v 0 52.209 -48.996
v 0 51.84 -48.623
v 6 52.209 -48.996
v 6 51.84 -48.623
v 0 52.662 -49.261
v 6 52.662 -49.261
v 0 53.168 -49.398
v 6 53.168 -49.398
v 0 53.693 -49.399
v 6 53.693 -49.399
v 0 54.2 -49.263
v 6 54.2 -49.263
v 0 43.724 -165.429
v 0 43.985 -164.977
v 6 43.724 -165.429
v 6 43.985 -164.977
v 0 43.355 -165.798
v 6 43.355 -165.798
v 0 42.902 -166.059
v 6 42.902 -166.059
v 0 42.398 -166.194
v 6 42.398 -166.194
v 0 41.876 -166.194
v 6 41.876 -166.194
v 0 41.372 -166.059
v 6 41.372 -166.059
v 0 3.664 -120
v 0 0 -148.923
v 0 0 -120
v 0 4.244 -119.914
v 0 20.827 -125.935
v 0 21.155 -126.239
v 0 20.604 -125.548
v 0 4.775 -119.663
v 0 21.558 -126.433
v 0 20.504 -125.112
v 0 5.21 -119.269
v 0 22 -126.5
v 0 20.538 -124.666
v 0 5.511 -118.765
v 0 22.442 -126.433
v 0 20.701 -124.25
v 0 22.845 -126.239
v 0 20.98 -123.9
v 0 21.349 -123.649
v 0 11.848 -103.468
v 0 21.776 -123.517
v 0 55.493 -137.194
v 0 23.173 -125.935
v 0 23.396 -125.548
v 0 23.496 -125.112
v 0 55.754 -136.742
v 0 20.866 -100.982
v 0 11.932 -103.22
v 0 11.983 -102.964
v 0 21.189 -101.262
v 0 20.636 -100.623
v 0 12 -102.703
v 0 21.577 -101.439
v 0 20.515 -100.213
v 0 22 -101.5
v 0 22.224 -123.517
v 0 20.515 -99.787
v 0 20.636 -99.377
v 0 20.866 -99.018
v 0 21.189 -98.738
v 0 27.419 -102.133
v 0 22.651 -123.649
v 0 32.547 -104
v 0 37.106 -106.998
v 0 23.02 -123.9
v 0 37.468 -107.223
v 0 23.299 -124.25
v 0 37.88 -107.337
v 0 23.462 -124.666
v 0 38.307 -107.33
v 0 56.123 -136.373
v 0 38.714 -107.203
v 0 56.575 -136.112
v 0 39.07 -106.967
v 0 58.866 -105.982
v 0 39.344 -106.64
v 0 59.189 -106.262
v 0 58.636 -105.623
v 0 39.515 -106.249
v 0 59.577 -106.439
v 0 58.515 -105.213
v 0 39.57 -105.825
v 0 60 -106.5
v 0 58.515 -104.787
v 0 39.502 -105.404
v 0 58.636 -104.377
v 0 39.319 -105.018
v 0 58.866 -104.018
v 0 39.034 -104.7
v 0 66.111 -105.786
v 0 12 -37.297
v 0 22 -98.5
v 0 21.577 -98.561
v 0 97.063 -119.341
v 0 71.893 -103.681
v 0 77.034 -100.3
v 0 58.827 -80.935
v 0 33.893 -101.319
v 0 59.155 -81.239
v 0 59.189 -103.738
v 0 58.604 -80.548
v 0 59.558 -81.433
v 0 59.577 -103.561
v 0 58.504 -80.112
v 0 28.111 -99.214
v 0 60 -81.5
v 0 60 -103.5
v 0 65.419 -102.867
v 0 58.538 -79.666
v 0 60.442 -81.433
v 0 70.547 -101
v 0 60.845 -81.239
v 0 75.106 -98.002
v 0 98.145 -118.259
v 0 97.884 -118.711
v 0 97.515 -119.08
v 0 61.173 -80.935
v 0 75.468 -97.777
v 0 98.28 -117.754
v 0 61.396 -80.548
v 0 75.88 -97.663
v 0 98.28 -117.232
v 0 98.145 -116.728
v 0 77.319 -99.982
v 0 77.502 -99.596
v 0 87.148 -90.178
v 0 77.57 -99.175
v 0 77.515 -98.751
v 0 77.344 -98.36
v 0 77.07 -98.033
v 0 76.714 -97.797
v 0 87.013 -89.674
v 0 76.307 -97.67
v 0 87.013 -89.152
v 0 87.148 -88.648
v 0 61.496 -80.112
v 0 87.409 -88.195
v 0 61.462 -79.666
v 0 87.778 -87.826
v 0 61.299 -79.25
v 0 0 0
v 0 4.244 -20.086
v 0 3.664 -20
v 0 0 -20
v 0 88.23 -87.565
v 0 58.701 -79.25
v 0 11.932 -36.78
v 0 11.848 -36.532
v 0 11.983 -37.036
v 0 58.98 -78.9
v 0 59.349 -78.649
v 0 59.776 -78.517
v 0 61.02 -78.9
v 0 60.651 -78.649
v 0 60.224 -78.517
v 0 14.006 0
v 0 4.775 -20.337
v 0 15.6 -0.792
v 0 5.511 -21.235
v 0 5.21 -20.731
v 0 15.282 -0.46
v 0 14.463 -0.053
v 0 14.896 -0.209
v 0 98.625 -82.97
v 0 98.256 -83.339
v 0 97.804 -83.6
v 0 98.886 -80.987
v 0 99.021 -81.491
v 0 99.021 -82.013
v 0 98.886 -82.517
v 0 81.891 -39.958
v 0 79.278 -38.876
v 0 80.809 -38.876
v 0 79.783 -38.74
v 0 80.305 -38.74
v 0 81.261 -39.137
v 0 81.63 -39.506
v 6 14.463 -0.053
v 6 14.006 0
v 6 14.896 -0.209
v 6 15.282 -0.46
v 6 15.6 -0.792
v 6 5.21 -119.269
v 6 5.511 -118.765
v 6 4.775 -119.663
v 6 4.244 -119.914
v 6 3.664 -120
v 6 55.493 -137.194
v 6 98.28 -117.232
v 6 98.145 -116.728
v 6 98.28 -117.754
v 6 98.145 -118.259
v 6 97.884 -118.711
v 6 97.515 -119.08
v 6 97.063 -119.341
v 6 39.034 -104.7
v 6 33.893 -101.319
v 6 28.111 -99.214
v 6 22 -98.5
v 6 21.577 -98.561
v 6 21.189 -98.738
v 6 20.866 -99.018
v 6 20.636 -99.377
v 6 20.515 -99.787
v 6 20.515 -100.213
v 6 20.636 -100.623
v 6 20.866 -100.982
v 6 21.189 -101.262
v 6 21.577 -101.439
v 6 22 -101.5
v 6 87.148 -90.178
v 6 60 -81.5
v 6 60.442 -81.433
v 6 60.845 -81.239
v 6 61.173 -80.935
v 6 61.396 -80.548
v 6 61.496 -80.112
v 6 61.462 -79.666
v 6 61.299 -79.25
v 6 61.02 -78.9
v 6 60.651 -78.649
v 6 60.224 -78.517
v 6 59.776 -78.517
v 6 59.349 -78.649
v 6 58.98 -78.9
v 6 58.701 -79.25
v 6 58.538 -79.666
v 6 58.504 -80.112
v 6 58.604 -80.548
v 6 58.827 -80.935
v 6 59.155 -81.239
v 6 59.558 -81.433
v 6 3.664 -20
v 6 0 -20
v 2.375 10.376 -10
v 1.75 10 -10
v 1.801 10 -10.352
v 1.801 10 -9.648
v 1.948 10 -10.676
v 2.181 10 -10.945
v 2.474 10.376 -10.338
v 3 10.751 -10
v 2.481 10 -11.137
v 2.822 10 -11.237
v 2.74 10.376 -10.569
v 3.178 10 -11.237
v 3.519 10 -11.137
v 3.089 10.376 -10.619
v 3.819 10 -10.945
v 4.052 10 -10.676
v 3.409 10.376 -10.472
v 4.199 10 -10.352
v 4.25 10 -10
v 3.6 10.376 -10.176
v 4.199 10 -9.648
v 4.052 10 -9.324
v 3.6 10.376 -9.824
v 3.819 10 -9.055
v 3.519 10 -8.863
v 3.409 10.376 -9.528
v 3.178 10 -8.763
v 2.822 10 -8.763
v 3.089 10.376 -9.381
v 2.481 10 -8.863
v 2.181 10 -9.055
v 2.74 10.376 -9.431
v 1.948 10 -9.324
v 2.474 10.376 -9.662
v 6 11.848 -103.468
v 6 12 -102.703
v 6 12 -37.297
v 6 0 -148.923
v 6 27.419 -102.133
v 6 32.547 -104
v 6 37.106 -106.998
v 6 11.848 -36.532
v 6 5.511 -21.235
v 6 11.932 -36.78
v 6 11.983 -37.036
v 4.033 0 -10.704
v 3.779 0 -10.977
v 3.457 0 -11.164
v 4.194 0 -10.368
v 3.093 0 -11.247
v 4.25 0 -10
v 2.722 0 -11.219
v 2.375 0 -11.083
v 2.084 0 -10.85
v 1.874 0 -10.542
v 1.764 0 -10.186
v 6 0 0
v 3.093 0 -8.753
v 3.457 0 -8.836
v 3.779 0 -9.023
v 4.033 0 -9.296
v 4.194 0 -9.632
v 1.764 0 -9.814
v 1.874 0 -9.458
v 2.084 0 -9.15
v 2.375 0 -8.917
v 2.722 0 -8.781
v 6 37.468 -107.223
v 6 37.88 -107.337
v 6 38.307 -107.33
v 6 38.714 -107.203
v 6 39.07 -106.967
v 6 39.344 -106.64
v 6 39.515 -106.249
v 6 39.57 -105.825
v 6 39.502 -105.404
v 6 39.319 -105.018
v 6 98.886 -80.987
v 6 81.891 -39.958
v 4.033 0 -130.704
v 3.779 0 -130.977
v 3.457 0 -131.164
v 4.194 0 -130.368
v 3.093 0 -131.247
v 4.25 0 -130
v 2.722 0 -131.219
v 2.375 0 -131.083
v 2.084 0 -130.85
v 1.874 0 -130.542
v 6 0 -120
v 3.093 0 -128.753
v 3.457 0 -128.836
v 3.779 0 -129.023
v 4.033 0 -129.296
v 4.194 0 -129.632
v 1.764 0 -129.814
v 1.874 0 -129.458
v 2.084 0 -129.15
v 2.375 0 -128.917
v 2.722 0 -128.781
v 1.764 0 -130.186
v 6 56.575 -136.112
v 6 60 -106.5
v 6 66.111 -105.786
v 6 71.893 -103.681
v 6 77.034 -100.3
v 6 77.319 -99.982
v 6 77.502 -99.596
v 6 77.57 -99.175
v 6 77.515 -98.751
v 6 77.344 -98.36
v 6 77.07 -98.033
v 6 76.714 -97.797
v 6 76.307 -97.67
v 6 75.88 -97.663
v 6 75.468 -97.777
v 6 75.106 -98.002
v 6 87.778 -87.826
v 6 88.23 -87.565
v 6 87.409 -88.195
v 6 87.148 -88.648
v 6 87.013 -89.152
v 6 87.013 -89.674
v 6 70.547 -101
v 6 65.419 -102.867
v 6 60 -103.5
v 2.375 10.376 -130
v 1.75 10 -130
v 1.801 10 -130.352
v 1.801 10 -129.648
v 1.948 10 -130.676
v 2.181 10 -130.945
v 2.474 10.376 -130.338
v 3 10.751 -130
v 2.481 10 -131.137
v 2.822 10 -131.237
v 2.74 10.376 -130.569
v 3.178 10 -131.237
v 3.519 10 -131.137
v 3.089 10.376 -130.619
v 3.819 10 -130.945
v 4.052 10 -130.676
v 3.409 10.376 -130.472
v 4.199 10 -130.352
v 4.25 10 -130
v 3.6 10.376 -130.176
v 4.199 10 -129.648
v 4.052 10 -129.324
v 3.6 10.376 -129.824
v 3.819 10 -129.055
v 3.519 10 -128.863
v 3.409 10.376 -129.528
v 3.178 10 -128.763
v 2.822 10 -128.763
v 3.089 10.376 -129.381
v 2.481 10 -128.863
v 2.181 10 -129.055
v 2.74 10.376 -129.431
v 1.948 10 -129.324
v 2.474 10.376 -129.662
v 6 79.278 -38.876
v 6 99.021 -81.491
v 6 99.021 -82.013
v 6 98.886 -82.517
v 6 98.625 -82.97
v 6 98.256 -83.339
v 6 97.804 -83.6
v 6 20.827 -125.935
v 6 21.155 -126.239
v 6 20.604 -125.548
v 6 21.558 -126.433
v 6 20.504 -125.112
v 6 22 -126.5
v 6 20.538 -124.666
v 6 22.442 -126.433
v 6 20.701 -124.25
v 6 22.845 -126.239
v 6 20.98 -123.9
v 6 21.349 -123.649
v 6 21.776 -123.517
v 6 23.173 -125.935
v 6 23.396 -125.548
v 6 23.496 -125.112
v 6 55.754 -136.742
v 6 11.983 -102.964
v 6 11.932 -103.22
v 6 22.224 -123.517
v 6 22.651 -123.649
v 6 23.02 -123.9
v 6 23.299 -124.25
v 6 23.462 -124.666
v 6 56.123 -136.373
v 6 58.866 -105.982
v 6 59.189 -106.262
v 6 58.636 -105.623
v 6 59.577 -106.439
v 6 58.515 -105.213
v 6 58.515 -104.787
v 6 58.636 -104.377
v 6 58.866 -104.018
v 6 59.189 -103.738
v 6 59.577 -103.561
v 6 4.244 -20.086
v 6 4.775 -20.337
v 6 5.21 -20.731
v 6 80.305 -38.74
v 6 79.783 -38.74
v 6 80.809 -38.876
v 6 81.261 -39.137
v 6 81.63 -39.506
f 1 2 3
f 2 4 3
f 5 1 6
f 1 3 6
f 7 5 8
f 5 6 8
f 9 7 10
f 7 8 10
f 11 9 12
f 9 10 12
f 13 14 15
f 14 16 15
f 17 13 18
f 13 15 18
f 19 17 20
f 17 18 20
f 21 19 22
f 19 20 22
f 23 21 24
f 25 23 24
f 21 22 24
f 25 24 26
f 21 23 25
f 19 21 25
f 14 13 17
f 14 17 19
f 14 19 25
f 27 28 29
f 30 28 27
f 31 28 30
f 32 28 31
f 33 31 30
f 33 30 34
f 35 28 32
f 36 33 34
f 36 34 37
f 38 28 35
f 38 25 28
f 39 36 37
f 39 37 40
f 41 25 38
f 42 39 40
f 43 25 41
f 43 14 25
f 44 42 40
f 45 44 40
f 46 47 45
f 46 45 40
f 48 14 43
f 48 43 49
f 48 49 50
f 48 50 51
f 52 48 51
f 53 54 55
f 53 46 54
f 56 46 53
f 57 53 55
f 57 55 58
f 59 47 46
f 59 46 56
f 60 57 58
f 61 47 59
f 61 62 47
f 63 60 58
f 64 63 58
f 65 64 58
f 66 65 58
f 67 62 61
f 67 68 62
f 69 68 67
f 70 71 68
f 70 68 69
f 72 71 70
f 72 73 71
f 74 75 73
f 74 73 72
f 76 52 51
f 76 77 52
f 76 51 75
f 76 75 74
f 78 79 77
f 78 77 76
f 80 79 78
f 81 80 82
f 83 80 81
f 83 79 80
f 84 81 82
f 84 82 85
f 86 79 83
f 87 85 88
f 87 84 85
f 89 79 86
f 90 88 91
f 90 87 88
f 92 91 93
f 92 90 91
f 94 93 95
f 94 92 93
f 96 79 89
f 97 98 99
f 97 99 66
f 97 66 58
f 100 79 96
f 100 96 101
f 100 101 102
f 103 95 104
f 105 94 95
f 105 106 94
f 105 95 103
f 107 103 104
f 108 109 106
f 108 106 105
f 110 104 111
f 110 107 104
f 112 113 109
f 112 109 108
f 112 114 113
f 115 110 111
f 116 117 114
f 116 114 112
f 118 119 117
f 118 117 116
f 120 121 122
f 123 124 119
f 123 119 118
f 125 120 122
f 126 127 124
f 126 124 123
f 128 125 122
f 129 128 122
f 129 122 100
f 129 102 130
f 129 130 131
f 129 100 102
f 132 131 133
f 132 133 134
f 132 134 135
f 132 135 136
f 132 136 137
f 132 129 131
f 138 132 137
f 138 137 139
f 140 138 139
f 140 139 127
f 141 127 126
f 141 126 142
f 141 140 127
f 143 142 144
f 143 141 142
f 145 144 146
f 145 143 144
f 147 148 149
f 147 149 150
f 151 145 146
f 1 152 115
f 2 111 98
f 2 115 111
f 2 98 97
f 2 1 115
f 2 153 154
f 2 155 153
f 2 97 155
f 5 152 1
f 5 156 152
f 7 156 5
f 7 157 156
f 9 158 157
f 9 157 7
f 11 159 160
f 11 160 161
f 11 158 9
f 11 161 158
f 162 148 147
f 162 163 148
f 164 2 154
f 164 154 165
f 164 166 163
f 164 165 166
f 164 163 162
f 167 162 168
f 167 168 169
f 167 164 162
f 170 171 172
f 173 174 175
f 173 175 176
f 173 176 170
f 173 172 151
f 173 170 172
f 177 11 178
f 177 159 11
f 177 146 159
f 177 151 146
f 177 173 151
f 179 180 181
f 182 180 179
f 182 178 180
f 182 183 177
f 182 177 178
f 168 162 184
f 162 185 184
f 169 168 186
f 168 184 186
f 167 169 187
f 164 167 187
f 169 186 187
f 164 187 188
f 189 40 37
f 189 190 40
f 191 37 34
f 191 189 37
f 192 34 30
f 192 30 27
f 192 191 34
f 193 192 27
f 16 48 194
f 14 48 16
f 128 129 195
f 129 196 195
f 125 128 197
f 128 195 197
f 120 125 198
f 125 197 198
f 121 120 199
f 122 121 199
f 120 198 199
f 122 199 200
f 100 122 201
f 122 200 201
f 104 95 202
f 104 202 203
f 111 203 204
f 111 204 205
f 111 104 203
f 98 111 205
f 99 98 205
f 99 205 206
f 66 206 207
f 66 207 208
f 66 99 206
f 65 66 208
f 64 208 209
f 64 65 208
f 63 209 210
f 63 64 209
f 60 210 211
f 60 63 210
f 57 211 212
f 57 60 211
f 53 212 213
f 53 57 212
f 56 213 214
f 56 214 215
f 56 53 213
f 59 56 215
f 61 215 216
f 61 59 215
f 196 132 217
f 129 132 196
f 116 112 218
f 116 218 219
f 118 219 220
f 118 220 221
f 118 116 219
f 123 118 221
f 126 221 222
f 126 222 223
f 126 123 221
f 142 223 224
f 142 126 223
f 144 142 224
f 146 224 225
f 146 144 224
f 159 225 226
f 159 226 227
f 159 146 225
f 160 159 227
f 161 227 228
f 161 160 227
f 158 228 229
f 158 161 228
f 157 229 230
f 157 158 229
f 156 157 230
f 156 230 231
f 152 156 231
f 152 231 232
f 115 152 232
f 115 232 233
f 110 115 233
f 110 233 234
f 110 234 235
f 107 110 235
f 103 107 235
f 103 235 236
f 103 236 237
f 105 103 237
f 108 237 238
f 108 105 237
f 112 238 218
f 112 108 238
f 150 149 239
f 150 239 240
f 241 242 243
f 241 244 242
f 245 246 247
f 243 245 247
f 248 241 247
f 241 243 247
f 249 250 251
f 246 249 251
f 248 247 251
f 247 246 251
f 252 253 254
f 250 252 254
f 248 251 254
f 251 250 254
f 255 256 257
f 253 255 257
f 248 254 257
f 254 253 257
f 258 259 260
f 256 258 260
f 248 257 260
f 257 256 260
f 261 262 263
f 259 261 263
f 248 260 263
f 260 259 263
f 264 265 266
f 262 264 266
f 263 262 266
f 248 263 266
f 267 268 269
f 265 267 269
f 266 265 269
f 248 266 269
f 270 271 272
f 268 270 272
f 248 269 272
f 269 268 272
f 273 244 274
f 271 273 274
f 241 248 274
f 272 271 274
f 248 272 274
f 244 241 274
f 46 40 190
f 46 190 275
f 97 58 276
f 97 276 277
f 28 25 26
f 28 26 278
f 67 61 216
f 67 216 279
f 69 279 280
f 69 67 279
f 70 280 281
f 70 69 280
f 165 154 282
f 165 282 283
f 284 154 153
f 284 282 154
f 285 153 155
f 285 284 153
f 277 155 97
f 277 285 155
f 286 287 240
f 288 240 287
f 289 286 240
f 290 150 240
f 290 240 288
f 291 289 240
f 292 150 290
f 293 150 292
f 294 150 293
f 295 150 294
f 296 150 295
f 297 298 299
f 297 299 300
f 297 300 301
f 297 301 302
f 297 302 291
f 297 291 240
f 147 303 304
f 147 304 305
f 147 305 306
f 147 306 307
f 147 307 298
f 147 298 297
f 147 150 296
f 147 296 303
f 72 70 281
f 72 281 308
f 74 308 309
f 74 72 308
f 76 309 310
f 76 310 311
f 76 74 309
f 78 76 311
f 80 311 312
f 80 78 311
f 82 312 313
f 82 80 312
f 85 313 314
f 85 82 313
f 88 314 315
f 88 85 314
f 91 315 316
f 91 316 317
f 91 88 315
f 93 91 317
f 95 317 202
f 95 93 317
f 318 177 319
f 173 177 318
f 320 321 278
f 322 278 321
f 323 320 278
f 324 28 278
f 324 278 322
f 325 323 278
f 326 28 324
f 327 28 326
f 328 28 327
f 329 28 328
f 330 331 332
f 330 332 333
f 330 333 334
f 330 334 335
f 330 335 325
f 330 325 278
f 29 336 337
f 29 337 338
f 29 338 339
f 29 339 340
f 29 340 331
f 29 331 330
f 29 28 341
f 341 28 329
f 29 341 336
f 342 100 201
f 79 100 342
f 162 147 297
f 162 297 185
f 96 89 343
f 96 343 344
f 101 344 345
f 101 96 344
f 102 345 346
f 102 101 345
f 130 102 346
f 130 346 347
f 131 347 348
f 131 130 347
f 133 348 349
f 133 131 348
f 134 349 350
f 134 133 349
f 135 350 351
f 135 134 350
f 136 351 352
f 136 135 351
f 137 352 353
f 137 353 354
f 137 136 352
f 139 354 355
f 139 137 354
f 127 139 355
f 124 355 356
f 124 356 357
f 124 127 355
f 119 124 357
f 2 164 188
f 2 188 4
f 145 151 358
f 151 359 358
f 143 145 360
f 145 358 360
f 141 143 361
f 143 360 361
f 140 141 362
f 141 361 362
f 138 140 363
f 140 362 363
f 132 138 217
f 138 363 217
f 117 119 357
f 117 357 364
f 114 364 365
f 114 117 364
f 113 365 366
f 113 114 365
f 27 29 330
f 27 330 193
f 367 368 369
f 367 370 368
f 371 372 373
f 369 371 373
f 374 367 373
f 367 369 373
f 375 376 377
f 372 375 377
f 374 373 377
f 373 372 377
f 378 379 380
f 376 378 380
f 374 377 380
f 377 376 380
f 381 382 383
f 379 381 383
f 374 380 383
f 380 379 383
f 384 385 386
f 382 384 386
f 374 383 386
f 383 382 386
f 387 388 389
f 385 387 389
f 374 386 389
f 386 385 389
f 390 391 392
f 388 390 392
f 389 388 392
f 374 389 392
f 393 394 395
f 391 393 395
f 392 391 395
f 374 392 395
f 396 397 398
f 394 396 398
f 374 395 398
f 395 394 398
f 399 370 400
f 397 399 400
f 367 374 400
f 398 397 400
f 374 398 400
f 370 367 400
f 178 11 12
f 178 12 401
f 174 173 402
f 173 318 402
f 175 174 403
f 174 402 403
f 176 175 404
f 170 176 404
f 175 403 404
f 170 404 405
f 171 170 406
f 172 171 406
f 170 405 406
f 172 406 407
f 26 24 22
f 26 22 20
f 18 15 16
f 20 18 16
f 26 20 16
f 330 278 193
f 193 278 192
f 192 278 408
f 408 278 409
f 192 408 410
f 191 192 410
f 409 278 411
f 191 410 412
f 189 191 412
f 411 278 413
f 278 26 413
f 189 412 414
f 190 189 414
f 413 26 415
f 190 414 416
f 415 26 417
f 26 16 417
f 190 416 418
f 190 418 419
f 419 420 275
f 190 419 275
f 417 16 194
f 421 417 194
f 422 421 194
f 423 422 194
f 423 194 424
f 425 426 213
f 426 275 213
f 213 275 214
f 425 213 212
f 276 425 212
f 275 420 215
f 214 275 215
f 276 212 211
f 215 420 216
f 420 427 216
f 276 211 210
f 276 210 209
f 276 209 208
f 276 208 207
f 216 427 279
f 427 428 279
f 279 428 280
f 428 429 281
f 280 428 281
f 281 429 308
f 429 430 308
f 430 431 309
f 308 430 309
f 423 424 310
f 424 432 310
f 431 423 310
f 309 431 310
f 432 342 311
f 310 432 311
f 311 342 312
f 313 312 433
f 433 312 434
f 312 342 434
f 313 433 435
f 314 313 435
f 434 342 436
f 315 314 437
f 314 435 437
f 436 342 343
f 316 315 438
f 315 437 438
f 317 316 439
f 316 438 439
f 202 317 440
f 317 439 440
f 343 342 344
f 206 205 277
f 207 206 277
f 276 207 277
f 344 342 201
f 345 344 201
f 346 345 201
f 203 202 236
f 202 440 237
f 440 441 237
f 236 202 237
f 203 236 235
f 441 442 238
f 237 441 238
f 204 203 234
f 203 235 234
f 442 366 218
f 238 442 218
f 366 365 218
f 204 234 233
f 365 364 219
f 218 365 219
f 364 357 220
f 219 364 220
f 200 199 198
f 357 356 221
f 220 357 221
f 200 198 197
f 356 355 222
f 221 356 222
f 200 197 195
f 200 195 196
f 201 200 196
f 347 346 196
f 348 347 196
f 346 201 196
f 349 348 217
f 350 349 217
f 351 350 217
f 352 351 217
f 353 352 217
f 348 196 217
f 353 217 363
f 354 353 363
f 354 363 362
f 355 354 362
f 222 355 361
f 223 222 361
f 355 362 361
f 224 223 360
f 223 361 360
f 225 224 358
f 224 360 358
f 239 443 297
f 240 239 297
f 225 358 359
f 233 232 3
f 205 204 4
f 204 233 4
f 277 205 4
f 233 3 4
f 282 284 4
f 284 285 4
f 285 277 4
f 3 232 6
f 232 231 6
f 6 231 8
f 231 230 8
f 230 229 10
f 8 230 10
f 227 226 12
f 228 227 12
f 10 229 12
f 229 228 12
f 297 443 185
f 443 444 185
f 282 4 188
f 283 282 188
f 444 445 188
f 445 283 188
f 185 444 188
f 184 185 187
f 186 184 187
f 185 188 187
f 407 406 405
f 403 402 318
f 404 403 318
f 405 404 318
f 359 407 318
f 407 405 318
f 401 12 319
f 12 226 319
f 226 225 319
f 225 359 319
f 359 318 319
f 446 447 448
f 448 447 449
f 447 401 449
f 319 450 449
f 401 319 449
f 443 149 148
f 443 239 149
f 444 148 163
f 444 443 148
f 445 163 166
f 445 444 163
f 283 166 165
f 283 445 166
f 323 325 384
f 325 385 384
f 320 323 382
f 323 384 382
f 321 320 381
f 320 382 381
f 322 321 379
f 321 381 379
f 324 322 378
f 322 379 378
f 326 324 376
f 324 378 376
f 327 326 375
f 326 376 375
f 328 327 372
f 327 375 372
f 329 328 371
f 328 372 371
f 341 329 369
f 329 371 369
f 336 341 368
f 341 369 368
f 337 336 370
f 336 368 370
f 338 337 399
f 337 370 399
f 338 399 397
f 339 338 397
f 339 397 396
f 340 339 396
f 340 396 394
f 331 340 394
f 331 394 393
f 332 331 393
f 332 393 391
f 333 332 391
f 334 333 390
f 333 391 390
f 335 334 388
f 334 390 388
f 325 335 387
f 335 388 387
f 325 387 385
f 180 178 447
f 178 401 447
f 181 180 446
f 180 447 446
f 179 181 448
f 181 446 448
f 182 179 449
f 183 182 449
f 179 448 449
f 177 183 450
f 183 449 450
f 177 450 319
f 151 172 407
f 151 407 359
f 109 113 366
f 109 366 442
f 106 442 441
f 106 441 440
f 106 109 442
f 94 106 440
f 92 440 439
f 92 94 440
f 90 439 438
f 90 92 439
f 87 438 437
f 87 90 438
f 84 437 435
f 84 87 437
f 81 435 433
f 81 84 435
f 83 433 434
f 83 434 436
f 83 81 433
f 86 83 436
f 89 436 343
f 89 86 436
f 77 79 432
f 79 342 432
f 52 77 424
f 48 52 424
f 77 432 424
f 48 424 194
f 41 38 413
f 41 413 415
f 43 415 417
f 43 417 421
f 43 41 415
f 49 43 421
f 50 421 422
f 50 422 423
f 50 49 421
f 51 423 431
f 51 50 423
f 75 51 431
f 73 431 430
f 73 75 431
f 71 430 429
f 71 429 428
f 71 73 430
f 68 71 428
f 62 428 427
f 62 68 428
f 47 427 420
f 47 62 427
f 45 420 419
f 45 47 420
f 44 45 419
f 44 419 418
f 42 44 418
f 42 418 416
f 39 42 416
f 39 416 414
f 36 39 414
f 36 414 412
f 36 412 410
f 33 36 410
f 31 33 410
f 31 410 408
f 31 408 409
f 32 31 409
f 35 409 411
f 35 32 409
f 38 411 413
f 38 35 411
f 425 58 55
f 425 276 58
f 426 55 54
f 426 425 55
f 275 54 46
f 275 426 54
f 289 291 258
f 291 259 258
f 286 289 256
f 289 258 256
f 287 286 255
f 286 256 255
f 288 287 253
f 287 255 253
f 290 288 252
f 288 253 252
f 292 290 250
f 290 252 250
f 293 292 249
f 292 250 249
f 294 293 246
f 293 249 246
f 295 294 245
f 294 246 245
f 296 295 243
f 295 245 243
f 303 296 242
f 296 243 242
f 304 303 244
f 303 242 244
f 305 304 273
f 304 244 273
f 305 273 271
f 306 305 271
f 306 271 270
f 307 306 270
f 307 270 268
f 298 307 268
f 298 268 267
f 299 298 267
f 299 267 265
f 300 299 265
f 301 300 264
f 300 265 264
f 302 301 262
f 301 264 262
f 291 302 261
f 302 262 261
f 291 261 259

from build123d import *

# Parameters (mm, degrees)
SKETCH1_R                   = 1.5
BOSS_EXTRUDE1_DEPTH         = 6
FILLET1_R                   = 2
TAP_DRILL_FOR_M3_TAP1_D     = 2.5
TAP_DRILL_FOR_M3_TAP1_DEPTH = 10
TAP_DRILL_FOR_M3_TAP1_TIP   = 0.751075774


with BuildPart() as part:
    # Sketch1 → Boss-Extrude1 (new body)
    with BuildSketch(Plane(origin=(0, 0, 0), x_dir=(0, 0, -1), z_dir=(1, 0, 0))):
        Polygon((0, 0), (0, 15), (49.854455432, 52.772847367), (38.110170638, 81.126058999), (82.834388097, 99.651436437), (88.330517158, 86.382607119), (118.575687602, 98.910566914), (136.428533447, 55.809984346), (166.824723678, 43.219470108), (148.922633001, 0), (120, 0), (120, 5), (103.100505063, 12), (36.899494937, 12), (20, 5), (20, 0), align=None)
        with Locations((80, 60)):
            Circle(SKETCH1_R, mode=Mode.SUBTRACT)
        with Locations((125, 22)):
            Circle(SKETCH1_R, mode=Mode.SUBTRACT)
        with BuildLine():
            ThreePointArc((106.5, 60), (104.901854451, 69.063533798), (100.300177743, 77.033871657))
            ThreePointArc((100.300177743, 77.033871657), (98.186929663, 77.218756907), (98.002044413, 75.105508828))
            ThreePointArc((98.002044413, 75.105508828), (102.082776588, 68.037473368), (103.5, 60))
            ThreePointArc((103.5, 60), (105, 58.5), (106.5, 60))
        make_face(mode=Mode.SUBTRACT)
        with BuildLine():
            ThreePointArc((104.699822257, 39.033871657), (100.098145549, 31.063533798), (98.5, 22))
            ThreePointArc((98.5, 22), (100, 20.5), (101.5, 22))
            ThreePointArc((101.5, 22), (102.917223412, 30.037473368), (106.997955587, 37.105508828))
            ThreePointArc((106.997955587, 37.105508828), (106.813070337, 39.218756907), (104.699822257, 39.033871657))
        make_face(mode=Mode.SUBTRACT)
    extrude(amount=BOSS_EXTRUDE1_DEPTH)

    # Fillet1
    fillet1_edges = [part.edges().sort_by_distance(p)[0] for p in [
        (3, 15, 0),
        (3, 52.772847367, -49.854455432),
        (3, 81.126058999, -38.110170638),
        (3, 99.651436437, -82.834388097),
        (3, 86.382607119, -88.330517158),
        (3, 98.910566914, -118.575687602),
        (3, 55.809984346, -136.428533447),
        (3, 43.219470108, -166.824723678),
        (3, 5, -120),
        (3, 12, -103.100505063),
        (3, 12, -36.899494937),
        (3, 5, -20),
    ]]
    fillet(fillet1_edges, radius=FILLET1_R)

    # Tap Drill for M3 Tap1
    with Locations(Plane(origin=(0, 0, 0), x_dir=(-1, 0, 0), z_dir=(0, -1, 0))):
        with Locations((-3, 10), (-3, 130)):
            Hole(TAP_DRILL_FOR_M3_TAP1_D / 2, depth=TAP_DRILL_FOR_M3_TAP1_DEPTH)
            with Locations((0, 0, -(TAP_DRILL_FOR_M3_TAP1_DEPTH + TAP_DRILL_FOR_M3_TAP1_TIP / 2))):  # 118° drill point
                Cone(0, TAP_DRILL_FOR_M3_TAP1_D / 2, TAP_DRILL_FOR_M3_TAP1_TIP, mode=Mode.SUBTRACT)


solid = part.part
